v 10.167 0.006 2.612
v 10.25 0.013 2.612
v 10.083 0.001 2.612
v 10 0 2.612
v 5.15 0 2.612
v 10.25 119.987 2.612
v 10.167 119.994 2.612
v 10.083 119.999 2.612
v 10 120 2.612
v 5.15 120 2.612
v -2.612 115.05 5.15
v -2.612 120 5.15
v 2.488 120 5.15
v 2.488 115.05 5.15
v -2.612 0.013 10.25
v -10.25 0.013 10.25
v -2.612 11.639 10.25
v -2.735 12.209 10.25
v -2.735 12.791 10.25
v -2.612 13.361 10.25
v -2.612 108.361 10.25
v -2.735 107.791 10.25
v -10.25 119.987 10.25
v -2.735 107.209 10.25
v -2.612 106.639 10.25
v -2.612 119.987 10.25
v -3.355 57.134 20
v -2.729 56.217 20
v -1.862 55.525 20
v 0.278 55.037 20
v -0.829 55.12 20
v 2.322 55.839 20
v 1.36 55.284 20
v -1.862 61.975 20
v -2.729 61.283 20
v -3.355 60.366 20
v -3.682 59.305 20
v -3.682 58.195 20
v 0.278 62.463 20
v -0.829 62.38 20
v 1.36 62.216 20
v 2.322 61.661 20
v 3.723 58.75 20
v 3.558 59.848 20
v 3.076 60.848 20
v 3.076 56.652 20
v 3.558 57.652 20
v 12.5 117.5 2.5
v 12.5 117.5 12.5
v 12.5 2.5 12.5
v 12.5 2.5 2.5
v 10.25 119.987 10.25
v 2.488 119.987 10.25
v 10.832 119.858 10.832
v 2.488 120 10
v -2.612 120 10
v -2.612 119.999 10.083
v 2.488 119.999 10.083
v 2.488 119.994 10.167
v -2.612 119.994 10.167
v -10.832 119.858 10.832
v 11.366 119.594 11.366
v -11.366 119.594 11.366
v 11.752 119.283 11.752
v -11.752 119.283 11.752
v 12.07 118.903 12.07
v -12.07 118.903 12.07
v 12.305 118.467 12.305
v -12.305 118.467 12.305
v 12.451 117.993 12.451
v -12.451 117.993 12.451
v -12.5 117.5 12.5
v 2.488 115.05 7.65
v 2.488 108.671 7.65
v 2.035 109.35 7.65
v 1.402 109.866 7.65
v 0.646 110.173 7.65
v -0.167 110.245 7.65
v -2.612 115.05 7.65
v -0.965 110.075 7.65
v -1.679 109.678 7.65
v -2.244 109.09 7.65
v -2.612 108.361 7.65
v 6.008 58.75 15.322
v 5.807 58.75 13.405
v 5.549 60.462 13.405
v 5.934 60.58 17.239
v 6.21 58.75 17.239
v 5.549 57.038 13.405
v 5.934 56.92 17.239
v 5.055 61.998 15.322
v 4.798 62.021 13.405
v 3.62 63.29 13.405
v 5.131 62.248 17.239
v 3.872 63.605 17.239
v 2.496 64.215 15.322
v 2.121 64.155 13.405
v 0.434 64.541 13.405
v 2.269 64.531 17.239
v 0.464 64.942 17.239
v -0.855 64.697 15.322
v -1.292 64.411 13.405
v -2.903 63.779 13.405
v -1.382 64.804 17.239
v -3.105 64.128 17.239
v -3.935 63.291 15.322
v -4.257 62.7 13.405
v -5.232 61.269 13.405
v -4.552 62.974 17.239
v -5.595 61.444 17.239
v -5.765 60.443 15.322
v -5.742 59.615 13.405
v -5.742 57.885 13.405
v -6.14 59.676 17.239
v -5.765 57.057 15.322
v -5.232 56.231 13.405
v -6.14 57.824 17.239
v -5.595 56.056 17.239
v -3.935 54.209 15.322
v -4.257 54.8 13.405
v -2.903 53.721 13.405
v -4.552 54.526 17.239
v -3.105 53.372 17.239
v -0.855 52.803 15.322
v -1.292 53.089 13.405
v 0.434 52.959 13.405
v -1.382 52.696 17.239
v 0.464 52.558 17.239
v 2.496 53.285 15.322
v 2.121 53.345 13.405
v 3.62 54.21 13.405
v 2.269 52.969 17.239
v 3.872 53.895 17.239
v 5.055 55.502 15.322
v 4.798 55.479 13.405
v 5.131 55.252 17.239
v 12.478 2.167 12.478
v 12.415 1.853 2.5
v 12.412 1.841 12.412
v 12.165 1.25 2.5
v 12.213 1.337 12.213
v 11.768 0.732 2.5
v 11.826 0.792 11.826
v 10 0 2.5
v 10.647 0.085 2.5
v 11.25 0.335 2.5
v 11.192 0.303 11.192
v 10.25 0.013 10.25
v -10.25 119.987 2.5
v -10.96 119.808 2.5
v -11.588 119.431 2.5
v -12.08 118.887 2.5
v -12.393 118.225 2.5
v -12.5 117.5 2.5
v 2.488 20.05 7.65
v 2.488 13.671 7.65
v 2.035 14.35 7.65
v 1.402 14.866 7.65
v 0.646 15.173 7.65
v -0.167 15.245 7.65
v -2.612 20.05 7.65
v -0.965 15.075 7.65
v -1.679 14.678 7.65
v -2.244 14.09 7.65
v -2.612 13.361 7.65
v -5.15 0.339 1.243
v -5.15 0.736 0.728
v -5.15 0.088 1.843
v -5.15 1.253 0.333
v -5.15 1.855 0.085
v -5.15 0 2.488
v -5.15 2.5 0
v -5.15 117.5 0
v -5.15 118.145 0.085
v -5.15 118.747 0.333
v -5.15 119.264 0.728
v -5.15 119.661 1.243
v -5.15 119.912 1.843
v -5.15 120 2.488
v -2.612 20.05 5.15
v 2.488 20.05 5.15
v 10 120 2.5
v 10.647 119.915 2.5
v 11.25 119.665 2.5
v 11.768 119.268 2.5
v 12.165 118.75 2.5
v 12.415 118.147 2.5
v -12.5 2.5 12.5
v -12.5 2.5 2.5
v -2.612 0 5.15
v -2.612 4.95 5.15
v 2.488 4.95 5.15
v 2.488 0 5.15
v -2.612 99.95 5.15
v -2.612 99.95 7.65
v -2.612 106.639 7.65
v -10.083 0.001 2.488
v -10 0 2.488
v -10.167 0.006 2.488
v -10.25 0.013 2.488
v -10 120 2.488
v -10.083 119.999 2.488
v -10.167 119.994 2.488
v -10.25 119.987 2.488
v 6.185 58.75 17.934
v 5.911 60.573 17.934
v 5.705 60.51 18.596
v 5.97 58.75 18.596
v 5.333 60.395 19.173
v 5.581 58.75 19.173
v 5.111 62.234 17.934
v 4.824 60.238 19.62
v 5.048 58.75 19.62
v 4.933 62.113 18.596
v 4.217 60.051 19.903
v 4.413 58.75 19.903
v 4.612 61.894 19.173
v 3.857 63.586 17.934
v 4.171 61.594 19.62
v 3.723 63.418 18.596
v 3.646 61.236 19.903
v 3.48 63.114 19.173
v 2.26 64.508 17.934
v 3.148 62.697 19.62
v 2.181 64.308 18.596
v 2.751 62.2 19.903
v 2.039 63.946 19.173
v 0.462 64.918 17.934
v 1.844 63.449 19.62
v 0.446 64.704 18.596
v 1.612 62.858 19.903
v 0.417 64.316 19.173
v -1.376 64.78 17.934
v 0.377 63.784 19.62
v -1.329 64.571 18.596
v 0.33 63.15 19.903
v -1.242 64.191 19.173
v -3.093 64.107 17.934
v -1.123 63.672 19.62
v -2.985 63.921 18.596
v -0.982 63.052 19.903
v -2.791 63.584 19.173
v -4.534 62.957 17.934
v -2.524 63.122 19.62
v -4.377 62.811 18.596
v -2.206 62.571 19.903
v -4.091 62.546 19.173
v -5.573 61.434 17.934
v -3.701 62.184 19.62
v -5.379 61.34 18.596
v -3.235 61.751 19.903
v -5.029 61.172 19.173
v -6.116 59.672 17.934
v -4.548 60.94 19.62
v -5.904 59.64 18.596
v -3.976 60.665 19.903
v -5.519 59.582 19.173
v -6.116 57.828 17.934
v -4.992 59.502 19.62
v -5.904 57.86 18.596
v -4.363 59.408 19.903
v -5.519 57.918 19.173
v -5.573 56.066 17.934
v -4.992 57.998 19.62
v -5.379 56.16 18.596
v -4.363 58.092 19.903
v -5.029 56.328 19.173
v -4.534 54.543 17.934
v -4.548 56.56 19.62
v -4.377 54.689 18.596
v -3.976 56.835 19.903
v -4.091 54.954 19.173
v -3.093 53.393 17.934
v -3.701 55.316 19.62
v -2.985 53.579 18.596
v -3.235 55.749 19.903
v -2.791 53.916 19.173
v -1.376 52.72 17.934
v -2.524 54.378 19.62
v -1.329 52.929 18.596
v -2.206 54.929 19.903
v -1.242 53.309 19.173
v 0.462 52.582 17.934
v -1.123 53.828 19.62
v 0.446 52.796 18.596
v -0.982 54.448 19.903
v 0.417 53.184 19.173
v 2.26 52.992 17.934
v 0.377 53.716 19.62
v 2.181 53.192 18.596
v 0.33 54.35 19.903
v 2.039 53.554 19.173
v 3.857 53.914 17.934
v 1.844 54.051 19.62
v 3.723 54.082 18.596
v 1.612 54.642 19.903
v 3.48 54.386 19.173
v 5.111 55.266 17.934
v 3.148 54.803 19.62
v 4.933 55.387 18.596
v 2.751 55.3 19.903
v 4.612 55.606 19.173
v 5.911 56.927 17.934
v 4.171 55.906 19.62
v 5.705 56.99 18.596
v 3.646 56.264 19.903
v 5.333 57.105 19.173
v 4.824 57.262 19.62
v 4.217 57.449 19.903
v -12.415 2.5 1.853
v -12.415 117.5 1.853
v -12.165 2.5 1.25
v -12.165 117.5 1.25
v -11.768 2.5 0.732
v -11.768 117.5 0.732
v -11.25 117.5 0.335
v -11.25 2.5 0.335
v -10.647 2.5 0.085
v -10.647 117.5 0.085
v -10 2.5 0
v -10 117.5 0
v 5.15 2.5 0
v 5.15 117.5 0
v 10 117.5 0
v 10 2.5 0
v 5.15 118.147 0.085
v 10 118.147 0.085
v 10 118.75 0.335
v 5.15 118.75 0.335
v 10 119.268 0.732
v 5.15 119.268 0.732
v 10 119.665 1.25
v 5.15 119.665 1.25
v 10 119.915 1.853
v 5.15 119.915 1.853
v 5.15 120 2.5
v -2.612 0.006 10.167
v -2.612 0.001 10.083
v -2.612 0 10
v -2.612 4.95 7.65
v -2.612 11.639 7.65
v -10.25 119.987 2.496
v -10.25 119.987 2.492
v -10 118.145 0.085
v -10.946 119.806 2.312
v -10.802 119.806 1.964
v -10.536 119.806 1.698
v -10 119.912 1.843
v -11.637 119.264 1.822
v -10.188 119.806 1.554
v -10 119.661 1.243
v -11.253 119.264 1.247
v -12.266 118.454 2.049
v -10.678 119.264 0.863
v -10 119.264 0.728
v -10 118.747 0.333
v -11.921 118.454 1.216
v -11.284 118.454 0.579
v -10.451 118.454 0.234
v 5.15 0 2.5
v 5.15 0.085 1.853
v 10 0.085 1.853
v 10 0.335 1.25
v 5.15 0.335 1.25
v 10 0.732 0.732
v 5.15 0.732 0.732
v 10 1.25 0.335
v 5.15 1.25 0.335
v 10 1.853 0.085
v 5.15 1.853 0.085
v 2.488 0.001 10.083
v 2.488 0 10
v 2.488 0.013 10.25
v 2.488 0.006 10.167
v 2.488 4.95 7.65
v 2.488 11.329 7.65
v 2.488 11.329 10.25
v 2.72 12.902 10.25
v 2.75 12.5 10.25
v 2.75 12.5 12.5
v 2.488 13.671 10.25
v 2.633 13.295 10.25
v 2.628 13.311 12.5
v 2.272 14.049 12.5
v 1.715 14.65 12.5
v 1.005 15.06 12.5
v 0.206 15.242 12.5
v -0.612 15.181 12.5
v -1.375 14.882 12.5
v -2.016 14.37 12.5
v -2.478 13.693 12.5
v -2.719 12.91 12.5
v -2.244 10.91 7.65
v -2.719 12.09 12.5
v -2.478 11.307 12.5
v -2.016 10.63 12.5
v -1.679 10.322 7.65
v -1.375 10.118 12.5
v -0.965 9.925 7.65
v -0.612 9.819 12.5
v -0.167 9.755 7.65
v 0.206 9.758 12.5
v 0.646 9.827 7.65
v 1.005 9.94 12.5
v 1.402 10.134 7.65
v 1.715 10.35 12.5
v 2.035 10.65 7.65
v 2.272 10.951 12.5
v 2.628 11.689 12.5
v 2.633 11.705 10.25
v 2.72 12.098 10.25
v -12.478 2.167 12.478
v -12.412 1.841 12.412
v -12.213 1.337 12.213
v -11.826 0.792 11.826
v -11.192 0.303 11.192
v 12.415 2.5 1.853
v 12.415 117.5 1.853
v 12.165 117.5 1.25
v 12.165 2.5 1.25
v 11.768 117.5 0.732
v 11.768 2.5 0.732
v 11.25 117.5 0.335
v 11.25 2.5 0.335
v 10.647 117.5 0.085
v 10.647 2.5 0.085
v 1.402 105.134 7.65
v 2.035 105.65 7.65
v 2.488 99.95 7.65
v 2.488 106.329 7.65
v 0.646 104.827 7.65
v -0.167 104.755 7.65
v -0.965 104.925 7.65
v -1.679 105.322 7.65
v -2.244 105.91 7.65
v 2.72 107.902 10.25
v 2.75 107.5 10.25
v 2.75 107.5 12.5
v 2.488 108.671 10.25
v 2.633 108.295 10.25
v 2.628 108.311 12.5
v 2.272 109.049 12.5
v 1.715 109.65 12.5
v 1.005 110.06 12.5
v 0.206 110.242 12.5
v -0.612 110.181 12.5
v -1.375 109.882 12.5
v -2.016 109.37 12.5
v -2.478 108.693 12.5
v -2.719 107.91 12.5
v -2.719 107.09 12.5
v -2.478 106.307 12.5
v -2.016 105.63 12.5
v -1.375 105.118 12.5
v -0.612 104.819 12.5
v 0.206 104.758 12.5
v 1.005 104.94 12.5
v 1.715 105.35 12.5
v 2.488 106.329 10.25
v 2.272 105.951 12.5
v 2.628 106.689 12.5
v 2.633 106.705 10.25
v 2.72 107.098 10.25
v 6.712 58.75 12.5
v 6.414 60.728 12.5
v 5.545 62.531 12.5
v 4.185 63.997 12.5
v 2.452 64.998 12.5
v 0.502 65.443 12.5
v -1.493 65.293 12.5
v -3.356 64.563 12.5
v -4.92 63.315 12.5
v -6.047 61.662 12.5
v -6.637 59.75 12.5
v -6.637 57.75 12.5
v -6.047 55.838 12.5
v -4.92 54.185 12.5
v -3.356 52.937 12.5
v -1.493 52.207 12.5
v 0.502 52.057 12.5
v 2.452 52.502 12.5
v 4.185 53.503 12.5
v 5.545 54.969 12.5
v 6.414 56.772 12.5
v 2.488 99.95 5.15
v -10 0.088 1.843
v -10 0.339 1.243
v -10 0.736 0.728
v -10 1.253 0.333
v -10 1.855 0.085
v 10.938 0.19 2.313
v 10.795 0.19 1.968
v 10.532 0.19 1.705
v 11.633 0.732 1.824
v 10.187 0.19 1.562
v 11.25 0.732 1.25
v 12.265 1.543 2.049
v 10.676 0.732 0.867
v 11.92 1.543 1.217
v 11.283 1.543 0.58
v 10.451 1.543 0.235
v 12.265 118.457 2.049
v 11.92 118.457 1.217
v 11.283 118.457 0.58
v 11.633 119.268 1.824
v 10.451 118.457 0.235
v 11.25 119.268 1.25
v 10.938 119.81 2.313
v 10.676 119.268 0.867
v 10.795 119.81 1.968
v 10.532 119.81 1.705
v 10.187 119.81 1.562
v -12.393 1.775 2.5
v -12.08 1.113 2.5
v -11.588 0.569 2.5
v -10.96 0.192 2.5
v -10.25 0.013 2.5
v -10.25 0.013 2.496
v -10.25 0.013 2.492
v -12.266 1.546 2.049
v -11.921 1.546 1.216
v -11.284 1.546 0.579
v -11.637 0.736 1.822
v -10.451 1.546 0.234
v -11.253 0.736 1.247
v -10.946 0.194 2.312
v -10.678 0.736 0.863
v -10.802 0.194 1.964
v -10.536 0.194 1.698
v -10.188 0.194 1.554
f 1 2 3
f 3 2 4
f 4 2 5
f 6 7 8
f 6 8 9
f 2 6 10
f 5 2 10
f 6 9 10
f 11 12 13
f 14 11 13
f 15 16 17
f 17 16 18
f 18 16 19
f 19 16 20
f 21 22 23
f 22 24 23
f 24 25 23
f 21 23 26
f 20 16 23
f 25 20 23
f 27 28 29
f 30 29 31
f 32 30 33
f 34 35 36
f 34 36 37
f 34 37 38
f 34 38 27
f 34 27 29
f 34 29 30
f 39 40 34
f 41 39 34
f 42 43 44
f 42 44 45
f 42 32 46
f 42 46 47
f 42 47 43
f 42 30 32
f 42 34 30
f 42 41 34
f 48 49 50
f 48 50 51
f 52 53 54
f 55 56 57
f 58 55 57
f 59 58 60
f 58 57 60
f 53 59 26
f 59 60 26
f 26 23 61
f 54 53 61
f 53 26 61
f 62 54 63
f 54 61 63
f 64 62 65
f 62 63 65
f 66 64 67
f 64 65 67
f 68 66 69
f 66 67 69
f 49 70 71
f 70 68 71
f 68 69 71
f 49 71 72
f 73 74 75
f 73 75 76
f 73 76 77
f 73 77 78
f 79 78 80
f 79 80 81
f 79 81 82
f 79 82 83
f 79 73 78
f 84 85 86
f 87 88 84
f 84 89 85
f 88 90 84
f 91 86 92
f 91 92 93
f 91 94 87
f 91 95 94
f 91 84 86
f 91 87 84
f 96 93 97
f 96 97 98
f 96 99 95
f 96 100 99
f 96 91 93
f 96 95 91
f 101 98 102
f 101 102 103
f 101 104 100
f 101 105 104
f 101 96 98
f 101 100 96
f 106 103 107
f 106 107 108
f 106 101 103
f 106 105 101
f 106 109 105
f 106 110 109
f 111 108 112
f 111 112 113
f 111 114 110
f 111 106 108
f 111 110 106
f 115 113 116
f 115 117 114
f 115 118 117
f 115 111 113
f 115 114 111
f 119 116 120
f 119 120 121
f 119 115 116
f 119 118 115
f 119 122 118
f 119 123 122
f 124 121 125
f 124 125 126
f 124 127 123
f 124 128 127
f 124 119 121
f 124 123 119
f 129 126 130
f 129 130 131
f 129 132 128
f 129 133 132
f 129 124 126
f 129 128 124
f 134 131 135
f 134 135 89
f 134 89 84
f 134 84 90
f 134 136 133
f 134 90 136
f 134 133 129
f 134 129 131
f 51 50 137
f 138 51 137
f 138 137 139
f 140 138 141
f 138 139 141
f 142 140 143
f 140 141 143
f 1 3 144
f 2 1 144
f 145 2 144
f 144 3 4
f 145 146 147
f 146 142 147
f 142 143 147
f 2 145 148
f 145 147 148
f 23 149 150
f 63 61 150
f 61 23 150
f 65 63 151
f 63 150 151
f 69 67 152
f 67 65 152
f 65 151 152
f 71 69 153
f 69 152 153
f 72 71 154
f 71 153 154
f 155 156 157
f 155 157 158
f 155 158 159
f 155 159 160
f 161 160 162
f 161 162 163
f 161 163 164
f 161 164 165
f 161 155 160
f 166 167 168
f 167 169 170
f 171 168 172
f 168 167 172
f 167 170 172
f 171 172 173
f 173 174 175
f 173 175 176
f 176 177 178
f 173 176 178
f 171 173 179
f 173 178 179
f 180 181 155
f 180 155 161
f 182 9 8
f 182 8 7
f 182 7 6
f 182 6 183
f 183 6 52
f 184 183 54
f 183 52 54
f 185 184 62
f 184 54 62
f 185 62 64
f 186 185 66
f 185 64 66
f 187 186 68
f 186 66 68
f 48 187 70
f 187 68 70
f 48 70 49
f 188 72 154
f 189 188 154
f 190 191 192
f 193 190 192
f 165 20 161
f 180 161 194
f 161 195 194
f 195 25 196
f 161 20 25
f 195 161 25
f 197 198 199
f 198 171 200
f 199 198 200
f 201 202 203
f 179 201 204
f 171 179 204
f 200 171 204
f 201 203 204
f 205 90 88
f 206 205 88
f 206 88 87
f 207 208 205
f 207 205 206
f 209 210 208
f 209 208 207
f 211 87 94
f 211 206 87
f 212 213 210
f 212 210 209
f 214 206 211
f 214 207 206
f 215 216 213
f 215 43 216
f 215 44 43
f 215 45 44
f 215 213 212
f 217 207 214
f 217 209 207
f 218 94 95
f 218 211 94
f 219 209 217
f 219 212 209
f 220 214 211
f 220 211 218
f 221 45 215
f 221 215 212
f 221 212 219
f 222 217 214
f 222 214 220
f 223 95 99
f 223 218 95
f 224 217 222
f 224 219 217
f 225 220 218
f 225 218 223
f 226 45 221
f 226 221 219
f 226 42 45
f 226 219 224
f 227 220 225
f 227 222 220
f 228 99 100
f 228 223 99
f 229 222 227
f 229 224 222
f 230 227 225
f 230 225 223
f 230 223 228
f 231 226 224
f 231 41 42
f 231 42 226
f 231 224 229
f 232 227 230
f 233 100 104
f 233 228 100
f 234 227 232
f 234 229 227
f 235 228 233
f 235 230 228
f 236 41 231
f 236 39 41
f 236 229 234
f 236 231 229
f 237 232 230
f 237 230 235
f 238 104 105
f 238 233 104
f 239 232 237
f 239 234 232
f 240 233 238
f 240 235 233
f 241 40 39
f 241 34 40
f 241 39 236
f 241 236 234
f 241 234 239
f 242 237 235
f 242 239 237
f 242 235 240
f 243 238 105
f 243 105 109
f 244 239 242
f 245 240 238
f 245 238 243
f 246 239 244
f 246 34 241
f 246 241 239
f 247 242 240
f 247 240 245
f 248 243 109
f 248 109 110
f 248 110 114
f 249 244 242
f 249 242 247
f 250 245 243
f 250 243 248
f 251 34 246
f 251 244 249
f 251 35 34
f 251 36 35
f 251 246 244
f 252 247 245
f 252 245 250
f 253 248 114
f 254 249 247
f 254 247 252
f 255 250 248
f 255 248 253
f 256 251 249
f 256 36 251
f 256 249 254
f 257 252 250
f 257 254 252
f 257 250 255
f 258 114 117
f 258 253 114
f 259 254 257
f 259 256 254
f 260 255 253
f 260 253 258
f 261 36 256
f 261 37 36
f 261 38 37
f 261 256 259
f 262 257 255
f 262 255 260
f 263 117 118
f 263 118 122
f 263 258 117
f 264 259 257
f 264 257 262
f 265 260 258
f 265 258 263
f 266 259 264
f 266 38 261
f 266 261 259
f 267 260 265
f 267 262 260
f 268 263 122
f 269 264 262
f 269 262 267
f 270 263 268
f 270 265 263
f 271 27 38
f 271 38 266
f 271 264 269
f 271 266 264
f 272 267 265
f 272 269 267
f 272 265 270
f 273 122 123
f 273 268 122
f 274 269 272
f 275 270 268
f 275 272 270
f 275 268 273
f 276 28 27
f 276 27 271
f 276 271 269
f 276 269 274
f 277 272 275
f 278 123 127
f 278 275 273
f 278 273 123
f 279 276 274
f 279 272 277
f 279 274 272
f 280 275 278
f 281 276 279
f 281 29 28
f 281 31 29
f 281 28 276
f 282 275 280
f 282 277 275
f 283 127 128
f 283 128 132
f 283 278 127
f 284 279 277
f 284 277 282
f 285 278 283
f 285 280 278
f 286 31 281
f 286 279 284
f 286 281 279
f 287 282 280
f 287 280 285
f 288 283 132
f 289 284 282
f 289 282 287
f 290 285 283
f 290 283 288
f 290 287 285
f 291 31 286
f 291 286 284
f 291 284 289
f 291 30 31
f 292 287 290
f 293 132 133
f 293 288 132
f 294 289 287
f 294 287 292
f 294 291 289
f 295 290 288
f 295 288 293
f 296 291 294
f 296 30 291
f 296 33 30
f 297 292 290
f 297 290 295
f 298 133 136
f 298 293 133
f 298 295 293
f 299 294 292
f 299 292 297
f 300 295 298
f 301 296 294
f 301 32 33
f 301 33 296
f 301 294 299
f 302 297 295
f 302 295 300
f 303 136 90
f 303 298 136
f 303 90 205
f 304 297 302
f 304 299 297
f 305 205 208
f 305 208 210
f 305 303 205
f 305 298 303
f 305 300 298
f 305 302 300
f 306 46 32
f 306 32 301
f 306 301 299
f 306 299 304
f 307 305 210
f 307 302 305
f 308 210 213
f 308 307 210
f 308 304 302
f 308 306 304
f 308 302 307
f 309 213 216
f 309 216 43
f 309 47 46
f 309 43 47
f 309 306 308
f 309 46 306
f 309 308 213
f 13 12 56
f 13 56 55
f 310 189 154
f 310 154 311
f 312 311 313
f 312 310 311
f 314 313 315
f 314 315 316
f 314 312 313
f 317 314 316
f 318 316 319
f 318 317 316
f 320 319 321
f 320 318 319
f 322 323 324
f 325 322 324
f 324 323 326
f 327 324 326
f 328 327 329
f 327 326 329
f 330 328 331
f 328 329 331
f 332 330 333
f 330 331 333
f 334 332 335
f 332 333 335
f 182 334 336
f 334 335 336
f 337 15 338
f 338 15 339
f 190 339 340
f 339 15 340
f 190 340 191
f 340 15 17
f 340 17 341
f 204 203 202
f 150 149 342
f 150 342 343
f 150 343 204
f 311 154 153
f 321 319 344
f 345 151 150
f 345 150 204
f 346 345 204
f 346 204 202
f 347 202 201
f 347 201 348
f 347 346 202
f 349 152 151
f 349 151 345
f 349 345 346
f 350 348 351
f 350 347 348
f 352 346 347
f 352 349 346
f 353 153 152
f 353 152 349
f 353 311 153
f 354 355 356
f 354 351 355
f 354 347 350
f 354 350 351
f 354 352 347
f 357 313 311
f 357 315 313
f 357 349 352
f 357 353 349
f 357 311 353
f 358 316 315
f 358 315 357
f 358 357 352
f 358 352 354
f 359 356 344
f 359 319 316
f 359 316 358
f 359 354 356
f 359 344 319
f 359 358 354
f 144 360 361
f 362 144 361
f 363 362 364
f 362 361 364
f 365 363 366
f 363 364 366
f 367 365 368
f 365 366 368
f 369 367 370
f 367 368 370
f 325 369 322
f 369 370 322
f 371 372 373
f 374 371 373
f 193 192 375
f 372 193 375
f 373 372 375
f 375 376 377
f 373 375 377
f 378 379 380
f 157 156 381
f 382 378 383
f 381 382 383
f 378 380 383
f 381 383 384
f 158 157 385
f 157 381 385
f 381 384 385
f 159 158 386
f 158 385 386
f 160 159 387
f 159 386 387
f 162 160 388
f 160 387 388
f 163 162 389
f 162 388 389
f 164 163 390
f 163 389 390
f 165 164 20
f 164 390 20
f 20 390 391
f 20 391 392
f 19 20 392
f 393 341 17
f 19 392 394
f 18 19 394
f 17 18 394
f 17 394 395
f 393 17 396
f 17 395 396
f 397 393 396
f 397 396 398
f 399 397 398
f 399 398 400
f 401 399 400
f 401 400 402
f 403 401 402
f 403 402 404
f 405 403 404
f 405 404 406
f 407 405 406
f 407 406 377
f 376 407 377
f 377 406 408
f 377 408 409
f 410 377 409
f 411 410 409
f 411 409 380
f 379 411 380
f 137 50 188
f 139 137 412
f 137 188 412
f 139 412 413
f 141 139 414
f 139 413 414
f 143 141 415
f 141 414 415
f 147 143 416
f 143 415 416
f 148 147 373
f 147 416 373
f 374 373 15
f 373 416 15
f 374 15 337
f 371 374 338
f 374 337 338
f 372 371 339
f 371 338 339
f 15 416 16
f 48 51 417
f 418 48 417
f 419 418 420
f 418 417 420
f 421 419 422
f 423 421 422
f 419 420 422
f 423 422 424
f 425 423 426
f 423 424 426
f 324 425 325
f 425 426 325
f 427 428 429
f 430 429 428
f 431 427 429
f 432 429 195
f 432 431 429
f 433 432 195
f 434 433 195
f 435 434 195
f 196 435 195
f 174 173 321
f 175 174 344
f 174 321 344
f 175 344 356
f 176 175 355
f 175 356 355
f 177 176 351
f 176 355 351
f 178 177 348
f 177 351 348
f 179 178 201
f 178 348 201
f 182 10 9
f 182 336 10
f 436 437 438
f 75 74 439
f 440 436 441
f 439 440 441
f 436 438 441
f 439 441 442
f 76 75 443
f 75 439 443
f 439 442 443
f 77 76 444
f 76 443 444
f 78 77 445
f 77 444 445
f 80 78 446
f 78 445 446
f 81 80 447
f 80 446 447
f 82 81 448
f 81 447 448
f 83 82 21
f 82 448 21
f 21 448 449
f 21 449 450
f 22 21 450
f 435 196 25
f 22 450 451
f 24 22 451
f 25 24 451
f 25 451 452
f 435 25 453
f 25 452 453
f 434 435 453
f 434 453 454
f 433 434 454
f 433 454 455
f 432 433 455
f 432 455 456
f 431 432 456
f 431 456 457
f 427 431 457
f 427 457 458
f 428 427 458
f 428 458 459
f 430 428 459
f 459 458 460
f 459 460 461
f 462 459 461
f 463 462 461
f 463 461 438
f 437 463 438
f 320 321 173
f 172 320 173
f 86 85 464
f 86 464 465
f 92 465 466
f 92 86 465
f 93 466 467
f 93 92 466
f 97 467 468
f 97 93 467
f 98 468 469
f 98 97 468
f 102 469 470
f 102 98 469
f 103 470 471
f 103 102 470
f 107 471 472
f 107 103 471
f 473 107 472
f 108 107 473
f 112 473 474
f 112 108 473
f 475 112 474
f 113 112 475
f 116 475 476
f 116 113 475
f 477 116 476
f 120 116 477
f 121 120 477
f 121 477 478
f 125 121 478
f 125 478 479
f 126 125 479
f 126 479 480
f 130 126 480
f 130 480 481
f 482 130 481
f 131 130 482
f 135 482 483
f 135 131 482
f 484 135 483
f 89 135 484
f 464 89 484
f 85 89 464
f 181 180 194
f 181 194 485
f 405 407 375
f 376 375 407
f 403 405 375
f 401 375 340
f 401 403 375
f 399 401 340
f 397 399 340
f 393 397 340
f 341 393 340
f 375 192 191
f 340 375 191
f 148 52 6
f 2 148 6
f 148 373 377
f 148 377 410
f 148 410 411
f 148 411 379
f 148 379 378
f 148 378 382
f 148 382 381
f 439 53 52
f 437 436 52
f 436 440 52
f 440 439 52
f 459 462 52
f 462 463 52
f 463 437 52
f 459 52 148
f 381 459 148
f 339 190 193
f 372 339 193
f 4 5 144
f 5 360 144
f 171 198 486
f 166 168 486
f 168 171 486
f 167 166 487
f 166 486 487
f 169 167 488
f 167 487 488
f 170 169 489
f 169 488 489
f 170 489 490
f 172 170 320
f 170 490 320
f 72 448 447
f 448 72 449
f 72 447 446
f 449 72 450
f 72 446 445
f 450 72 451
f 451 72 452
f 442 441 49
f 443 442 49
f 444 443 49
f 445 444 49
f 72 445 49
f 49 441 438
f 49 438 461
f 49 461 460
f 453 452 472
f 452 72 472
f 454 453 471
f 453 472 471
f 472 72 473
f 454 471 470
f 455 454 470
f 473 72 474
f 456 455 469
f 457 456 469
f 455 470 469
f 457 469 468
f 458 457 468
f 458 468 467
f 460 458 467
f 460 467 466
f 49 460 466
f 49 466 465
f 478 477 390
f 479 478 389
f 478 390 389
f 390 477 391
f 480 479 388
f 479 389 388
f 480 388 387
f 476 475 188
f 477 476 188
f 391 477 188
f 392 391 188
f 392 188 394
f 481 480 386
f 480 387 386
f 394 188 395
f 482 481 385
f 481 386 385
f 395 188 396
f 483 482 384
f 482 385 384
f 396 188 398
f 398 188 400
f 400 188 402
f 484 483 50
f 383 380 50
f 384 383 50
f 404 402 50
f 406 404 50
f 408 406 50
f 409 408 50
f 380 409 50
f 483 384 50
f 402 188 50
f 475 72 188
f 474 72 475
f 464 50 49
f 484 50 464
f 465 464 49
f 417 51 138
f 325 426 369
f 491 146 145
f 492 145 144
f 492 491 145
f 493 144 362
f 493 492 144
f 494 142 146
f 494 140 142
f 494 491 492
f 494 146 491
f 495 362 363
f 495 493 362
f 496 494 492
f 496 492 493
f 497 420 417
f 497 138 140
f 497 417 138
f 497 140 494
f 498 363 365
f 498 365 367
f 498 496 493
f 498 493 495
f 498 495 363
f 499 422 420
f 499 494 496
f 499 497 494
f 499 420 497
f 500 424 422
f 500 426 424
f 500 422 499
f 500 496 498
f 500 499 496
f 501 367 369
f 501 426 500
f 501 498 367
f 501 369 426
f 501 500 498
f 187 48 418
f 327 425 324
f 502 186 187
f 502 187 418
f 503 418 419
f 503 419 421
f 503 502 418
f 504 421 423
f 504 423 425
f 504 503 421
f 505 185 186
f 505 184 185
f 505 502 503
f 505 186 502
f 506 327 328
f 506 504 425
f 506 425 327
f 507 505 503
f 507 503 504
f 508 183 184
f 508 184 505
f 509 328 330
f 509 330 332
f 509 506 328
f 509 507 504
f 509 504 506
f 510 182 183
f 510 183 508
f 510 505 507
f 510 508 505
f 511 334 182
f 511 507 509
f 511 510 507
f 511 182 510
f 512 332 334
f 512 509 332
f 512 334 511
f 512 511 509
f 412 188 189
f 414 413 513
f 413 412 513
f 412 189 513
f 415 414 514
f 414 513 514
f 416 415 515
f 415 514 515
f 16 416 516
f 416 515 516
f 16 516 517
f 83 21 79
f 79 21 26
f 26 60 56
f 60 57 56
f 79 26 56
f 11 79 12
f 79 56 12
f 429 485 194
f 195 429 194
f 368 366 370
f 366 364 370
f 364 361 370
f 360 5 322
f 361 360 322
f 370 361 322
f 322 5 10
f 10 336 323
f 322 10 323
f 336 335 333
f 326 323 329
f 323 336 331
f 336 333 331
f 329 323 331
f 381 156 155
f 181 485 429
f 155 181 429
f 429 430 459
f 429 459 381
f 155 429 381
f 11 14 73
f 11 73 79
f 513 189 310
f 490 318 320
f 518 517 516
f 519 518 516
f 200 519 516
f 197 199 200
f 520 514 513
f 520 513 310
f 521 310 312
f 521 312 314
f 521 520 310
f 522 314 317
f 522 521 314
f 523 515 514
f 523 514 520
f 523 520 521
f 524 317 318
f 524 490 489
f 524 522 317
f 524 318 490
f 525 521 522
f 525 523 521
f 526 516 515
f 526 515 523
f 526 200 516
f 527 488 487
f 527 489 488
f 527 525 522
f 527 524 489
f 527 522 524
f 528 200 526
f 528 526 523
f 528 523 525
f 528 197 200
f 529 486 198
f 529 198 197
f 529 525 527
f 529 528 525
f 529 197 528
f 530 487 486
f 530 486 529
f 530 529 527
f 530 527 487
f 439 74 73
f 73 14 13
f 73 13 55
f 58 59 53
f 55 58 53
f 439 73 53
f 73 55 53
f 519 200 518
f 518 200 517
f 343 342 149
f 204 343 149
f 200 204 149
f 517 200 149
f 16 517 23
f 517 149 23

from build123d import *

# Parameters (mm, degrees)
SKETCH1_W           = 25
SKETCH1_H           = 25
BOSS_EXTRUDE1_DEPTH = 120
CUT_EXTRUDE1_DEPTH  = 120
SKETCH3_W           = 25
SKETCH3_H           = 12.5
CUT_EXTRUDE2_DEPTH  = 120
FILLET1_R           = 2.5
FILLET2_R           = 2.5
FILLET3_R           = 2.5
SKETCH6_R           = 2.75
CUT_EXTRUDE3_DEPTH  = 10
SKETCH7_W           = 10.05
SKETCH7_H           = 15.1
CUT_EXTRUDE4_DEPTH  = 2.5
SKETCH9_R           = 6.5
BOSS_EXTRUDE3_DEPTH = 7.5
BOSS_EXTRUDE3_DRAFT = -6
FILLET4_R           = 2.5
CHAMFER1_SIZE       = 1
CHAMFER1_SIZE2      = 0.909876415


with BuildPart() as part:
    # Sketch1 → Boss-Extrude1 (new body)
    with BuildSketch(Plane(origin=(0, 0, 0), x_dir=(1, 0, 0), z_dir=(0, 1, 0))):
        Rectangle(SKETCH1_W, SKETCH1_H)
    extrude(amount=BOSS_EXTRUDE1_DEPTH)

    # Sketch2 → Cut-Extrude1 (cut)
    with BuildSketch(Plane(origin=(0, 120, 0), x_dir=(1, 0, 0), z_dir=(0, 1, 0))):
        Polygon((-10.25, -2.48824277), (-10.25, -10.25), (-2.61175723, -10.25), (-2.61175723, -5.15), (2.48824277, -5.15), (2.48824277, -10.25), (10.25, -10.25), (10.25, -2.61175723), (5.15, -2.61175723), (5.15, 2.48824277), (10.25, 2.48824277), (10.25, 10.25), (2.61175723, 10.25), (2.61175723, 5.15), (-2.48824277, 5.15), (-2.48824277, 10.25), (-10.25, 10.25), (-10.25, 2.61175723), (-5.15, 2.61175723), (-5.15, -2.48824277), align=None)
    extrude(amount=-CUT_EXTRUDE1_DEPTH, mode=Mode.SUBTRACT)

    # Sketch3 → Cut-Extrude2 (cut)
    with BuildSketch(Plane(origin=(0, 120, 0), x_dir=(1, 0, 0), z_dir=(0, 1, 0))):
        with Locations((0, 6.25)):
            Rectangle(SKETCH3_W, SKETCH3_H)
    extrude(amount=-CUT_EXTRUDE2_DEPTH, mode=Mode.SUBTRACT)

    # Fillet1
    fillet1_edges = [part.edges().sort_by_distance(p)[0] for p in [
        (-12.5, 60, 0),
    ]]
    fillet(fillet1_edges, radius=FILLET1_R)

    # Fillet2
    fillet2_edges = [part.edges().sort_by_distance(p)[0] for p in [
        (12.5, 60, 0),
    ]]
    fillet(fillet2_edges, radius=FILLET2_R)

    # Fillet3
    # the kernel refuses this fillet: 2.5 mm, written as the material it takes off along each edge
    with BuildSketch(Plane(origin=(-10, 0, 0), x_dir=(0, 0, 1), z_dir=(1, 0, 0)), Plane(origin=(-1.1, 0, 0), x_dir=(0, 0, 1), z_dir=(1, 0, 0)), Plane(origin=(-10, 120, 0), x_dir=(0, -1, 0), z_dir=(1, 0, 0)), Plane(origin=(-1.1, 120, 0), x_dir=(0, -1, 0), z_dir=(1, 0, 0))) as fillet3_piece_1:
        with BuildLine():
            CenterArc((FILLET3_R, -FILLET3_R), FILLET3_R, 90, 90)
            Line((0, -FILLET3_R), (0, 0))
            Line((0, 0), (FILLET3_R, 0))
        make_face()
    extrude(amount=11.1, mode=Mode.SUBTRACT)
    with BuildSketch(Plane(origin=(-10, 0, 2.5), x_dir=(-1, 0, 0), z_dir=(0, 0, 1))) as fillet3_piece_2:
        with BuildLine():
            CenterArc((2.5 - FILLET3_R, -FILLET3_R), FILLET3_R, 0, 90)
            Line((2.5, -FILLET3_R), (2.5, 0))
            Line((2.5, 0), (2.5 - FILLET3_R, 0))
        make_face()
    revolve(axis=Axis((-10, 0, 2.5), (0, -1, 0)), revolution_arc=90, mode=Mode.SUBTRACT)
    with BuildSketch(Plane(origin=(10, 0, 2.5), x_dir=(1, 0, 0), z_dir=(0, 0, 1))) as fillet3_piece_3:
        with BuildLine():
            CenterArc((2.5 - FILLET3_R, FILLET3_R), FILLET3_R, 270, 90)
            Line((2.5, FILLET3_R), (2.5, 0))
            Line((2.5, 0), (2.5 - FILLET3_R, 0))
        make_face()
    revolve(axis=Axis((10, 0, 2.5), (0, 1, 0)), revolution_arc=90, mode=Mode.SUBTRACT)
    with BuildSketch(Plane(origin=(-10, 120, 2.5), x_dir=(-1, 0, 0), z_dir=(0, 0, 1))) as fillet3_piece_4:
        with BuildLine():
            CenterArc((2.5 - FILLET3_R, FILLET3_R), FILLET3_R, 270, 90)
            Line((2.5 - FILLET3_R, 0), (2.5, 0))
            Line((2.5, 0), (2.5, FILLET3_R))
        make_face()
    revolve(axis=Axis((-10, 120, 2.5), (0, -1, 0)), revolution_arc=90, mode=Mode.SUBTRACT)
    with BuildSketch(Plane(origin=(10, 120, 2.5), x_dir=(1, 0, 0), z_dir=(0, 0, 1))) as fillet3_piece_5:
        with BuildLine():
            CenterArc((2.5 - FILLET3_R, -FILLET3_R), FILLET3_R, 0, 90)
            Line((2.5 - FILLET3_R, 0), (2.5, 0))
            Line((2.5, 0), (2.5, -FILLET3_R))
        make_face()
    revolve(axis=Axis((10, 120, 2.5), (0, 1, 0)), revolution_arc=90, mode=Mode.SUBTRACT)
    with BuildSketch(Plane(origin=(-18.75, 0, 12.5), x_dir=(0, 0, -1), z_dir=(1, 0, 0)), Plane(origin=(-18.75, 120, 12.5), x_dir=(0, -1, 0), z_dir=(1, 0, 0))) as fillet3_piece_6:
        with BuildLine():
            CenterArc((FILLET3_R, FILLET3_R), FILLET3_R, 180, 90)
            Line((0, FILLET3_R), (0, 0))
            Line((0, 0), (FILLET3_R, 0))
        make_face()
    extrude(amount=37.5, mode=Mode.SUBTRACT)
    with BuildSketch(Plane(origin=(-12.5, 0, 2.5), x_dir=(1, 0, 0), z_dir=(0, 0, 1)), Plane(origin=(12.5, 0, 18.75), x_dir=(-1, 0, 0), z_dir=(0, 0, -1)), Plane(origin=(-12.5, 120, 2.5), x_dir=(0, -1, 0), z_dir=(0, 0, 1)), Plane(origin=(12.5, 120, 18.75), x_dir=(0, -1, 0), z_dir=(0, 0, -1))) as fillet3_piece_7:
        with BuildLine():
            CenterArc((FILLET3_R, FILLET3_R), FILLET3_R, 180, 90)
            Line((0, FILLET3_R), (0, 0))
            Line((0, 0), (FILLET3_R, 0))
        make_face()
    extrude(amount=16.25, mode=Mode.SUBTRACT)

    # Sketch6 → Cut-Extrude3 (cut)
    with BuildSketch(Plane.XY.offset(12.5)):
        with Locations((0, 107.5)):
            Circle(SKETCH6_R)
        with Locations((0, 12.5)):
            Circle(SKETCH6_R)
    extrude(amount=-CUT_EXTRUDE3_DEPTH, mode=Mode.SUBTRACT)

    # Sketch7 → Cut-Extrude4 (cut)
    with BuildSketch(Plane(origin=(0, 0, 5.15), x_dir=(-1, 0, 0), z_dir=(0, 0, -1))):
        with Locations((0, 107.5)):
            Rectangle(SKETCH7_W, SKETCH7_H)
        with Locations((0, 12.5)):
            Rectangle(SKETCH7_W, SKETCH7_H)
    extrude(amount=-CUT_EXTRUDE4_DEPTH, mode=Mode.SUBTRACT)


with BuildPart() as boss_extrude3_tool:
    # Sketch9 → Boss-Extrude3 (with draft: the straight prism first)
    with BuildSketch(Plane.XY.offset(20)):
        with Locations((0, 58.75)):
            Circle(SKETCH9_R)
    extrude(amount=-BOSS_EXTRUDE3_DEPTH)
    # Boss-Extrude3: the draft: its side faces are tilted about the plane it starts from
    boss_extrude3_sides = [boss_extrude3_tool.faces().sort_by_distance(p)[0] for p in [
        (-6.5, 58.75, 16.25),
    ]]
    draft(boss_extrude3_sides, Plane.XY.offset(20), BOSS_EXTRUDE3_DRAFT)


with BuildPart() as part_1:
    add(part.part)

    # Boss-Extrude3: add boss_extrude3_tool
    add(boss_extrude3_tool.part)

    # Fillet4
    fillet4_edges = [part_1.edges().sort_by_distance(p)[0] for p in [
        (-6.5, 58.75, 20),
    ]]
    fillet(fillet4_edges, radius=FILLET4_R)

    # Chamfer1
    chamfer1_edges = [part_1.edges().sort_by_distance(p)[0] for p in [
        (-5.711718236, 58.75, 12.5),
    ]]
    chamfer1_side = [part_1.faces().sort_by_distance(p)[0] for p in [
        (0, 3.67686023, 12.5),
    ]]
    chamfer(chamfer1_edges, length=CHAMFER1_SIZE, length2=CHAMFER1_SIZE2, reference=chamfer1_side[0])


solid = part_1.part
